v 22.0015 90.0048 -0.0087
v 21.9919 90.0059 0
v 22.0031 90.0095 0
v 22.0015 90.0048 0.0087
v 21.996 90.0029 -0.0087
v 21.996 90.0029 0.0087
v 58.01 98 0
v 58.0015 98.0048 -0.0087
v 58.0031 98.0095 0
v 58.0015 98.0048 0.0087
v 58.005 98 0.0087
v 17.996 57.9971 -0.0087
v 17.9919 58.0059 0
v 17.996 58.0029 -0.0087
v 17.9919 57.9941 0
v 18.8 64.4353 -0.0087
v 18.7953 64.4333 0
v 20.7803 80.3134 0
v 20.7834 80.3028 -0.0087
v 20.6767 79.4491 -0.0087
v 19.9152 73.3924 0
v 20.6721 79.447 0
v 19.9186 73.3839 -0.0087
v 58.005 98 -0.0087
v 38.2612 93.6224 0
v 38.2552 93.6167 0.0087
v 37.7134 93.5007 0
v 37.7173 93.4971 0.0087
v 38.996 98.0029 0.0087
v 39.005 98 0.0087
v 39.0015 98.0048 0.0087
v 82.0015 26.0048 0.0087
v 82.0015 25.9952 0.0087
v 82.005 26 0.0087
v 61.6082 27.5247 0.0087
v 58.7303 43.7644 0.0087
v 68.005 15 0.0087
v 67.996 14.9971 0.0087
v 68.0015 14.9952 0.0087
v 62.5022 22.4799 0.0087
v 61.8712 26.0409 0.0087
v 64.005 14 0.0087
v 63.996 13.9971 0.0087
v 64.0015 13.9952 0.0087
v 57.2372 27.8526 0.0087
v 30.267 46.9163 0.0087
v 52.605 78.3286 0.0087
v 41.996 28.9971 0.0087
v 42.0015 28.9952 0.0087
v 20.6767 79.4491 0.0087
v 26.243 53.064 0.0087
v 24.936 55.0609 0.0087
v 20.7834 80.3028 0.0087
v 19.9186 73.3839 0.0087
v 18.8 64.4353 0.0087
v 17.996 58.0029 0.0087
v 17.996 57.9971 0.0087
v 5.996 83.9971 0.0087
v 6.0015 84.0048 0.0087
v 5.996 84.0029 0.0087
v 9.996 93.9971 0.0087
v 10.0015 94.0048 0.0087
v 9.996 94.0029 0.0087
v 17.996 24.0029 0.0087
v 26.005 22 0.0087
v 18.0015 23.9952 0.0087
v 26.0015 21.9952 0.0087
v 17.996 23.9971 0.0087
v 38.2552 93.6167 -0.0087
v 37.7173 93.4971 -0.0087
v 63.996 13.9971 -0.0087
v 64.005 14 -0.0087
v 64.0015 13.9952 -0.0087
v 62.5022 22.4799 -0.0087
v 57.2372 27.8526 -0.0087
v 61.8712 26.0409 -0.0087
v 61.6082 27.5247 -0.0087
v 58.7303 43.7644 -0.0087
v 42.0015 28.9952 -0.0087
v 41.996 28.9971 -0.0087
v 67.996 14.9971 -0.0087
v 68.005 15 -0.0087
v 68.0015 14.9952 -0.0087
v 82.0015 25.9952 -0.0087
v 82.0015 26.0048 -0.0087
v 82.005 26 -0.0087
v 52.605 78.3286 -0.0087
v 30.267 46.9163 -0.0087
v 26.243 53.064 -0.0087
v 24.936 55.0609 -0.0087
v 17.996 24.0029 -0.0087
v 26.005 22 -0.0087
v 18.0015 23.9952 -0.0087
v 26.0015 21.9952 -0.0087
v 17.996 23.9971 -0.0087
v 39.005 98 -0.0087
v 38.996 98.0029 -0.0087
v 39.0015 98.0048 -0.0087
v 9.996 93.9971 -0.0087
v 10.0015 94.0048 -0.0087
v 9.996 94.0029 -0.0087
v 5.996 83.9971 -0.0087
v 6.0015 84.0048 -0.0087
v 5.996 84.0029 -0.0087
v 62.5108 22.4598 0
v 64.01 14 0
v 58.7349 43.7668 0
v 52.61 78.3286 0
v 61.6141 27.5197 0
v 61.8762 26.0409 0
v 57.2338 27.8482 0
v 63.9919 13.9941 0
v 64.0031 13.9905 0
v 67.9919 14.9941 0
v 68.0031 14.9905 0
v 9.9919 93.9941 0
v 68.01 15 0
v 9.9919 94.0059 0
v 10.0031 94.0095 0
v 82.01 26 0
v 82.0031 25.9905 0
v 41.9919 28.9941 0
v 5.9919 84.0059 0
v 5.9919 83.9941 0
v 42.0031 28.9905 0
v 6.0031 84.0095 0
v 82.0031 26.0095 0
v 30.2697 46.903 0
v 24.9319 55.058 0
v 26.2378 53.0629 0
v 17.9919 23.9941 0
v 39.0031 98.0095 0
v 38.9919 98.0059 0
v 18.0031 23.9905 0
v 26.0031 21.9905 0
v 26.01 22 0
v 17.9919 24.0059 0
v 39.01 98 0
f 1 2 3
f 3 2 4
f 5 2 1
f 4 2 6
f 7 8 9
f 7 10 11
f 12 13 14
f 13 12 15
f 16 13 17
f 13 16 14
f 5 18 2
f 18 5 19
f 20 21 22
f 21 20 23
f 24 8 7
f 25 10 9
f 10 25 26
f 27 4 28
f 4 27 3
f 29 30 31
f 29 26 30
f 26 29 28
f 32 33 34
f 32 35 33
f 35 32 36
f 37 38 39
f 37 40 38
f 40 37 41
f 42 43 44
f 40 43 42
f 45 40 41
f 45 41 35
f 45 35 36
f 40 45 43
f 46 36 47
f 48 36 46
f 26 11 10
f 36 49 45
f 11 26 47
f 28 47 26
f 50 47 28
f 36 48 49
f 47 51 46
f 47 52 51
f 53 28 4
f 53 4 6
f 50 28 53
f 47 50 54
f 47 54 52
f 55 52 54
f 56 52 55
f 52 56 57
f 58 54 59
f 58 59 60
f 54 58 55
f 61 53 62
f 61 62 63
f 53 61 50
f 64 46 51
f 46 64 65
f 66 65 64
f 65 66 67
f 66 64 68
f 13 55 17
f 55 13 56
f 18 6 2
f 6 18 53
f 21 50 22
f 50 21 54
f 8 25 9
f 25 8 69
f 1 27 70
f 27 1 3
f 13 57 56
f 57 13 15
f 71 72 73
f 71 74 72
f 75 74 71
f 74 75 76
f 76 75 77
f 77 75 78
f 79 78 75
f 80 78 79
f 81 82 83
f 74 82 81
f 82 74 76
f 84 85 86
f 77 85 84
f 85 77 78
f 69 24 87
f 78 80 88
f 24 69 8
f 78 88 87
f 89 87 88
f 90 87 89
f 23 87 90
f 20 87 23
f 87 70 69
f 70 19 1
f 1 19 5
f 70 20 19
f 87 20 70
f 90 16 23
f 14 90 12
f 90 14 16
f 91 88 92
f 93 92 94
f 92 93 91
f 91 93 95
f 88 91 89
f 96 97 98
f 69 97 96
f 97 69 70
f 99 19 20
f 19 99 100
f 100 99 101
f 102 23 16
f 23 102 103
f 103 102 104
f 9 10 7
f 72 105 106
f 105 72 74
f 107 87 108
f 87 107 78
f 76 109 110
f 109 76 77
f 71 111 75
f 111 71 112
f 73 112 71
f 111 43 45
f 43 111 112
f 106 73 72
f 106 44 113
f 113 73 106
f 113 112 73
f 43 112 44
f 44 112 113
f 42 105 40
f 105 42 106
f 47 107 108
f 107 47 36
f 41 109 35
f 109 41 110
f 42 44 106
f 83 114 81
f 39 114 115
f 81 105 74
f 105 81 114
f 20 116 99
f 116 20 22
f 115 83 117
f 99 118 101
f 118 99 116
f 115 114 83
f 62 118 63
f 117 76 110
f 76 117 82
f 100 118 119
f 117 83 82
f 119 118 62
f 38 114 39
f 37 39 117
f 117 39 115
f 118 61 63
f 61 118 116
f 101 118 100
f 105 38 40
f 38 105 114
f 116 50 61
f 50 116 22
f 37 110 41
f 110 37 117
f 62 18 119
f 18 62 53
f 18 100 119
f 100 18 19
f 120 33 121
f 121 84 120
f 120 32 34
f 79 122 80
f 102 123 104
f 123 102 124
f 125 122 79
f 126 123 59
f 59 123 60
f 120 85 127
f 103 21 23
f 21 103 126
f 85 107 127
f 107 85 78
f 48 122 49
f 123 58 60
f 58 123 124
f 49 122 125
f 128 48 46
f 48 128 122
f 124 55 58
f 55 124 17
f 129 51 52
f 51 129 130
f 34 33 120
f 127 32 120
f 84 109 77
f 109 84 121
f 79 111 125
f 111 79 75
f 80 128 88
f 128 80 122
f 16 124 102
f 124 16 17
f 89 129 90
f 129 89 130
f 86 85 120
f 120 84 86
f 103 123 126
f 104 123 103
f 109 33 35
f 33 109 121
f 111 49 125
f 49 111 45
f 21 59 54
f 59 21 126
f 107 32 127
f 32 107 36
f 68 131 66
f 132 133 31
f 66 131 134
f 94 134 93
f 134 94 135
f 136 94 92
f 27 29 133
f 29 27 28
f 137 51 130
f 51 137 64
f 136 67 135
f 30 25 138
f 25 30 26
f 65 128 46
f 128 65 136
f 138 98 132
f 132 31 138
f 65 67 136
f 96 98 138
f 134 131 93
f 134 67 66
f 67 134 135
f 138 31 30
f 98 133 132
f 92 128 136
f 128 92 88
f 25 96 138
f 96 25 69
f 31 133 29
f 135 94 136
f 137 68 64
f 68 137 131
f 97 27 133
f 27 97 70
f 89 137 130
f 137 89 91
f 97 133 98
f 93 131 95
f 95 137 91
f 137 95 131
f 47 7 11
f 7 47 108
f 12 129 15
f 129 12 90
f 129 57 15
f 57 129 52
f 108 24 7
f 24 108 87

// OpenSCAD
color([0.3519350680925015,0.6477014615427978,0.14125726454845833]) hull(){
    translate([18,58]) sphere(0.01);
    translate([58,98]) sphere(0.01);
    translate([22,90]) sphere(0.01);
}
color([0.23013900541024712,0.8285218163248013,0.9603761550286747]) hull(){
    translate([50,93]) sphere(0.01);
    translate([44,55]) sphere(0.01);
    translate([64,14]) sphere(0.01);
}
color([0.6050710034948523,0.017553655236826726,0.43262871278032167]) hull(){
    translate([68,15]) sphere(0.01);
    translate([10,94]) sphere(0.01);
    translate([58,33]) sphere(0.01);
}
color([0.2571490251669072,0.4480229944680496,0.14517873337393172]) hull(){
    translate([6,84]) sphere(0.01);
    translate([82,26]) sphere(0.01);
    translate([42,29]) sphere(0.01);
}
color([0.8405131005933094,0.9776834869331054,0.10300019528175153]) hull(){
    translate([39,98]) sphere(0.01);
    translate([26,22]) sphere(0.01);
    translate([18,24]) sphere(0.01);
}
color([0.998153073210626,0.8535026464000083,0.6855970549077809]) hull(){
    translate([44,47]) sphere(0.01);
    translate([18,58]) sphere(0.01);
    translate([58,98]) sphere(0.01);
}
